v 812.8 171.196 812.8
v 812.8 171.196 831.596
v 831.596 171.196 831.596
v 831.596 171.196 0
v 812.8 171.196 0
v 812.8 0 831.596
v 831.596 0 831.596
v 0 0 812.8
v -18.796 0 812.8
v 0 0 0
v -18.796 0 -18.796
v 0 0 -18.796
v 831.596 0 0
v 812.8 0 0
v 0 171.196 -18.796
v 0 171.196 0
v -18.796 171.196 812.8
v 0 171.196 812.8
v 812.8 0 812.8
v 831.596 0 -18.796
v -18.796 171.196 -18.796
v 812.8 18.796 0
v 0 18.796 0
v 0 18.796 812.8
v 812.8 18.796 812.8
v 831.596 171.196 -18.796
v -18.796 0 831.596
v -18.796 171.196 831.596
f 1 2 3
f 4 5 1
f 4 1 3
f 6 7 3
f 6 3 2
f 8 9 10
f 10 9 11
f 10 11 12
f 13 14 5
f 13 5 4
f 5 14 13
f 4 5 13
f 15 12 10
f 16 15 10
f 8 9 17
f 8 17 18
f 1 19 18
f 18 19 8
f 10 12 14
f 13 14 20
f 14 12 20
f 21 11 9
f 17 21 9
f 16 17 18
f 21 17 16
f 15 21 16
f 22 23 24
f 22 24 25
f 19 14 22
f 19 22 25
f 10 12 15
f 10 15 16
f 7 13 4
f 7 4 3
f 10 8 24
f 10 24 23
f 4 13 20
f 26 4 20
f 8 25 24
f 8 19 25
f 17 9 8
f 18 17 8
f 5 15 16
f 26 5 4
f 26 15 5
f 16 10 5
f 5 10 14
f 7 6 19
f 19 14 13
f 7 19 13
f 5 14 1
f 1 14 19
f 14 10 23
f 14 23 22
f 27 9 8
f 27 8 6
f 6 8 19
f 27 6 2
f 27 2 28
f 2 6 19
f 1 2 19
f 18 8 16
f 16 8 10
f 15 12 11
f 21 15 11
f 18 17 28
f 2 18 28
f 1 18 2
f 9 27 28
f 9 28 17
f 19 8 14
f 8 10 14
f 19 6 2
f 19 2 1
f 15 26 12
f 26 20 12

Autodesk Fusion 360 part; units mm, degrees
sketch "Sketch1" plane through (0, 0, 0) normal (0, 1, 0) x (1, 0, 0)
  line L0 (0, 0) -> (812.8, 0)
  line L1 (812.8, 0) -> (812.8, -812.8)
  line L2 (812.8, -812.8) -> (0, -812.8)
  line L3 (0, -812.8) -> (0, 0)
  line L4 (0, 0) -> (831.596, 0)
  line L5 (831.596, 0) -> (831.596, 18.796)
  line L6 (831.596, 18.796) -> (0, 18.796)
  line L7 (0, 18.796) -> (0, 0)
  line L8 (812.8, 0) -> (831.596, 0)
  line L9 (831.596, 0) -> (831.596, -831.596)
  line L10 (831.596, -831.596) -> (812.8, -831.596)
  line L11 (812.8, -831.596) -> (812.8, 0)
  line L12 (812.8, -831.596) -> (-18.796, -831.596)
  line L13 (-18.796, -831.596) -> (-18.796, -812.8)
  line L14 (-18.796, -812.8) -> (812.8, -812.8)
  line L15 (812.8, -812.8) -> (812.8, -831.596)
  line L16 (-18.796, -812.8) -> (0, -812.8)
  line L17 (0, -812.8) -> (0, 18.796)
  line L18 (0, 18.796) -> (-18.796, 18.796)
  line L19 (-18.796, 18.796) -> (-18.796, -812.8)
  dimension "d5" = 812.8
  dimension "d6" = 812.8
  dimension "d7" = 831.596
  dimension "d8" = 18.796
  dimension "d9" = 18.796
  dimension "d10" = 831.596
  dimension "d11" = 831.596
  dimension "d12" = 18.796
  dimension "d13" = 18.796
  dimension "d14" = 831.596
extrude "Extrude1" add sketch "Sketch1" along normal blind 18.796 contours L0 L1 L2 L3 L4 L11 L14 L17 makes body 1 in component "Base"
extrude "Extrude1'" add sketch "Sketch1" along normal blind 171.196 separate body contours L0 L4 L5 L6 L7 L8 L17 makes body 2 in component "width1"
extrude "Extrude1''" add sketch "Sketch1" along normal blind 171.196 separate body contours L3 L7 L14 L16 L17 L18 L19 makes body 3 in component "length1"
extrude "Extrude1'''" add sketch "Sketch1" along normal blind 171.196 separate body contours L2 L11 L12 L13 L14 L15 L16 makes body 4 in component "width2"
extrude "Extrude1''''" add sketch "Sketch1" along normal blind 171.196 separate body contours L1 L4 L8 L9 L10 L11 L15 makes body 5 in component "length2"
component "Base" placed x (1, 0, 0) y (0, 1, 0) z (0, 0, 1) at (0, 0, 0)
component "width1" placed x (1, 0, 0) y (0, 1, 0) z (0, 0, 1) at (0, 0, 0)
component "length1" placed x (1, 0, 0) y (0, 1, 0) z (0, 0, 1) at (0, 0, 0)
component "width2" placed x (1, 0, 0) y (0, 1, 0) z (0, 0, 1) at (0, 0, 0)
component "length2" placed x (1, 0, 0) y (0, 1, 0) z (0, 0, 1) at (0, 0, 0)
equation "projectWidth = 32 in"
equation "projectLength = 32 in"
equation "materialThickness = 0.74 in"
equation "pourThickness = 5 in + materialThickness + headroom"
equation "d5 = projectWidth"
equation "d6 = projectLength"
equation "d7 = projectWidth + materialThickness"
equation "d8 = materialThickness"
equation "d9 = materialThickness"
equation "d10 = projectLength + materialThickness"
equation "d11 = projectWidth + materialThickness"
equation "d12 = materialThickness"
equation "d13 = materialThickness"
equation "d14 = projectLength + materialThickness"
equation "d15 = materialThickness"
equation "d17 = pourThickness"
equation "d19 = pourThickness"
equation "d21 = pourThickness"
equation "d23 = pourThickness"
equation "headroom = 1 in"
